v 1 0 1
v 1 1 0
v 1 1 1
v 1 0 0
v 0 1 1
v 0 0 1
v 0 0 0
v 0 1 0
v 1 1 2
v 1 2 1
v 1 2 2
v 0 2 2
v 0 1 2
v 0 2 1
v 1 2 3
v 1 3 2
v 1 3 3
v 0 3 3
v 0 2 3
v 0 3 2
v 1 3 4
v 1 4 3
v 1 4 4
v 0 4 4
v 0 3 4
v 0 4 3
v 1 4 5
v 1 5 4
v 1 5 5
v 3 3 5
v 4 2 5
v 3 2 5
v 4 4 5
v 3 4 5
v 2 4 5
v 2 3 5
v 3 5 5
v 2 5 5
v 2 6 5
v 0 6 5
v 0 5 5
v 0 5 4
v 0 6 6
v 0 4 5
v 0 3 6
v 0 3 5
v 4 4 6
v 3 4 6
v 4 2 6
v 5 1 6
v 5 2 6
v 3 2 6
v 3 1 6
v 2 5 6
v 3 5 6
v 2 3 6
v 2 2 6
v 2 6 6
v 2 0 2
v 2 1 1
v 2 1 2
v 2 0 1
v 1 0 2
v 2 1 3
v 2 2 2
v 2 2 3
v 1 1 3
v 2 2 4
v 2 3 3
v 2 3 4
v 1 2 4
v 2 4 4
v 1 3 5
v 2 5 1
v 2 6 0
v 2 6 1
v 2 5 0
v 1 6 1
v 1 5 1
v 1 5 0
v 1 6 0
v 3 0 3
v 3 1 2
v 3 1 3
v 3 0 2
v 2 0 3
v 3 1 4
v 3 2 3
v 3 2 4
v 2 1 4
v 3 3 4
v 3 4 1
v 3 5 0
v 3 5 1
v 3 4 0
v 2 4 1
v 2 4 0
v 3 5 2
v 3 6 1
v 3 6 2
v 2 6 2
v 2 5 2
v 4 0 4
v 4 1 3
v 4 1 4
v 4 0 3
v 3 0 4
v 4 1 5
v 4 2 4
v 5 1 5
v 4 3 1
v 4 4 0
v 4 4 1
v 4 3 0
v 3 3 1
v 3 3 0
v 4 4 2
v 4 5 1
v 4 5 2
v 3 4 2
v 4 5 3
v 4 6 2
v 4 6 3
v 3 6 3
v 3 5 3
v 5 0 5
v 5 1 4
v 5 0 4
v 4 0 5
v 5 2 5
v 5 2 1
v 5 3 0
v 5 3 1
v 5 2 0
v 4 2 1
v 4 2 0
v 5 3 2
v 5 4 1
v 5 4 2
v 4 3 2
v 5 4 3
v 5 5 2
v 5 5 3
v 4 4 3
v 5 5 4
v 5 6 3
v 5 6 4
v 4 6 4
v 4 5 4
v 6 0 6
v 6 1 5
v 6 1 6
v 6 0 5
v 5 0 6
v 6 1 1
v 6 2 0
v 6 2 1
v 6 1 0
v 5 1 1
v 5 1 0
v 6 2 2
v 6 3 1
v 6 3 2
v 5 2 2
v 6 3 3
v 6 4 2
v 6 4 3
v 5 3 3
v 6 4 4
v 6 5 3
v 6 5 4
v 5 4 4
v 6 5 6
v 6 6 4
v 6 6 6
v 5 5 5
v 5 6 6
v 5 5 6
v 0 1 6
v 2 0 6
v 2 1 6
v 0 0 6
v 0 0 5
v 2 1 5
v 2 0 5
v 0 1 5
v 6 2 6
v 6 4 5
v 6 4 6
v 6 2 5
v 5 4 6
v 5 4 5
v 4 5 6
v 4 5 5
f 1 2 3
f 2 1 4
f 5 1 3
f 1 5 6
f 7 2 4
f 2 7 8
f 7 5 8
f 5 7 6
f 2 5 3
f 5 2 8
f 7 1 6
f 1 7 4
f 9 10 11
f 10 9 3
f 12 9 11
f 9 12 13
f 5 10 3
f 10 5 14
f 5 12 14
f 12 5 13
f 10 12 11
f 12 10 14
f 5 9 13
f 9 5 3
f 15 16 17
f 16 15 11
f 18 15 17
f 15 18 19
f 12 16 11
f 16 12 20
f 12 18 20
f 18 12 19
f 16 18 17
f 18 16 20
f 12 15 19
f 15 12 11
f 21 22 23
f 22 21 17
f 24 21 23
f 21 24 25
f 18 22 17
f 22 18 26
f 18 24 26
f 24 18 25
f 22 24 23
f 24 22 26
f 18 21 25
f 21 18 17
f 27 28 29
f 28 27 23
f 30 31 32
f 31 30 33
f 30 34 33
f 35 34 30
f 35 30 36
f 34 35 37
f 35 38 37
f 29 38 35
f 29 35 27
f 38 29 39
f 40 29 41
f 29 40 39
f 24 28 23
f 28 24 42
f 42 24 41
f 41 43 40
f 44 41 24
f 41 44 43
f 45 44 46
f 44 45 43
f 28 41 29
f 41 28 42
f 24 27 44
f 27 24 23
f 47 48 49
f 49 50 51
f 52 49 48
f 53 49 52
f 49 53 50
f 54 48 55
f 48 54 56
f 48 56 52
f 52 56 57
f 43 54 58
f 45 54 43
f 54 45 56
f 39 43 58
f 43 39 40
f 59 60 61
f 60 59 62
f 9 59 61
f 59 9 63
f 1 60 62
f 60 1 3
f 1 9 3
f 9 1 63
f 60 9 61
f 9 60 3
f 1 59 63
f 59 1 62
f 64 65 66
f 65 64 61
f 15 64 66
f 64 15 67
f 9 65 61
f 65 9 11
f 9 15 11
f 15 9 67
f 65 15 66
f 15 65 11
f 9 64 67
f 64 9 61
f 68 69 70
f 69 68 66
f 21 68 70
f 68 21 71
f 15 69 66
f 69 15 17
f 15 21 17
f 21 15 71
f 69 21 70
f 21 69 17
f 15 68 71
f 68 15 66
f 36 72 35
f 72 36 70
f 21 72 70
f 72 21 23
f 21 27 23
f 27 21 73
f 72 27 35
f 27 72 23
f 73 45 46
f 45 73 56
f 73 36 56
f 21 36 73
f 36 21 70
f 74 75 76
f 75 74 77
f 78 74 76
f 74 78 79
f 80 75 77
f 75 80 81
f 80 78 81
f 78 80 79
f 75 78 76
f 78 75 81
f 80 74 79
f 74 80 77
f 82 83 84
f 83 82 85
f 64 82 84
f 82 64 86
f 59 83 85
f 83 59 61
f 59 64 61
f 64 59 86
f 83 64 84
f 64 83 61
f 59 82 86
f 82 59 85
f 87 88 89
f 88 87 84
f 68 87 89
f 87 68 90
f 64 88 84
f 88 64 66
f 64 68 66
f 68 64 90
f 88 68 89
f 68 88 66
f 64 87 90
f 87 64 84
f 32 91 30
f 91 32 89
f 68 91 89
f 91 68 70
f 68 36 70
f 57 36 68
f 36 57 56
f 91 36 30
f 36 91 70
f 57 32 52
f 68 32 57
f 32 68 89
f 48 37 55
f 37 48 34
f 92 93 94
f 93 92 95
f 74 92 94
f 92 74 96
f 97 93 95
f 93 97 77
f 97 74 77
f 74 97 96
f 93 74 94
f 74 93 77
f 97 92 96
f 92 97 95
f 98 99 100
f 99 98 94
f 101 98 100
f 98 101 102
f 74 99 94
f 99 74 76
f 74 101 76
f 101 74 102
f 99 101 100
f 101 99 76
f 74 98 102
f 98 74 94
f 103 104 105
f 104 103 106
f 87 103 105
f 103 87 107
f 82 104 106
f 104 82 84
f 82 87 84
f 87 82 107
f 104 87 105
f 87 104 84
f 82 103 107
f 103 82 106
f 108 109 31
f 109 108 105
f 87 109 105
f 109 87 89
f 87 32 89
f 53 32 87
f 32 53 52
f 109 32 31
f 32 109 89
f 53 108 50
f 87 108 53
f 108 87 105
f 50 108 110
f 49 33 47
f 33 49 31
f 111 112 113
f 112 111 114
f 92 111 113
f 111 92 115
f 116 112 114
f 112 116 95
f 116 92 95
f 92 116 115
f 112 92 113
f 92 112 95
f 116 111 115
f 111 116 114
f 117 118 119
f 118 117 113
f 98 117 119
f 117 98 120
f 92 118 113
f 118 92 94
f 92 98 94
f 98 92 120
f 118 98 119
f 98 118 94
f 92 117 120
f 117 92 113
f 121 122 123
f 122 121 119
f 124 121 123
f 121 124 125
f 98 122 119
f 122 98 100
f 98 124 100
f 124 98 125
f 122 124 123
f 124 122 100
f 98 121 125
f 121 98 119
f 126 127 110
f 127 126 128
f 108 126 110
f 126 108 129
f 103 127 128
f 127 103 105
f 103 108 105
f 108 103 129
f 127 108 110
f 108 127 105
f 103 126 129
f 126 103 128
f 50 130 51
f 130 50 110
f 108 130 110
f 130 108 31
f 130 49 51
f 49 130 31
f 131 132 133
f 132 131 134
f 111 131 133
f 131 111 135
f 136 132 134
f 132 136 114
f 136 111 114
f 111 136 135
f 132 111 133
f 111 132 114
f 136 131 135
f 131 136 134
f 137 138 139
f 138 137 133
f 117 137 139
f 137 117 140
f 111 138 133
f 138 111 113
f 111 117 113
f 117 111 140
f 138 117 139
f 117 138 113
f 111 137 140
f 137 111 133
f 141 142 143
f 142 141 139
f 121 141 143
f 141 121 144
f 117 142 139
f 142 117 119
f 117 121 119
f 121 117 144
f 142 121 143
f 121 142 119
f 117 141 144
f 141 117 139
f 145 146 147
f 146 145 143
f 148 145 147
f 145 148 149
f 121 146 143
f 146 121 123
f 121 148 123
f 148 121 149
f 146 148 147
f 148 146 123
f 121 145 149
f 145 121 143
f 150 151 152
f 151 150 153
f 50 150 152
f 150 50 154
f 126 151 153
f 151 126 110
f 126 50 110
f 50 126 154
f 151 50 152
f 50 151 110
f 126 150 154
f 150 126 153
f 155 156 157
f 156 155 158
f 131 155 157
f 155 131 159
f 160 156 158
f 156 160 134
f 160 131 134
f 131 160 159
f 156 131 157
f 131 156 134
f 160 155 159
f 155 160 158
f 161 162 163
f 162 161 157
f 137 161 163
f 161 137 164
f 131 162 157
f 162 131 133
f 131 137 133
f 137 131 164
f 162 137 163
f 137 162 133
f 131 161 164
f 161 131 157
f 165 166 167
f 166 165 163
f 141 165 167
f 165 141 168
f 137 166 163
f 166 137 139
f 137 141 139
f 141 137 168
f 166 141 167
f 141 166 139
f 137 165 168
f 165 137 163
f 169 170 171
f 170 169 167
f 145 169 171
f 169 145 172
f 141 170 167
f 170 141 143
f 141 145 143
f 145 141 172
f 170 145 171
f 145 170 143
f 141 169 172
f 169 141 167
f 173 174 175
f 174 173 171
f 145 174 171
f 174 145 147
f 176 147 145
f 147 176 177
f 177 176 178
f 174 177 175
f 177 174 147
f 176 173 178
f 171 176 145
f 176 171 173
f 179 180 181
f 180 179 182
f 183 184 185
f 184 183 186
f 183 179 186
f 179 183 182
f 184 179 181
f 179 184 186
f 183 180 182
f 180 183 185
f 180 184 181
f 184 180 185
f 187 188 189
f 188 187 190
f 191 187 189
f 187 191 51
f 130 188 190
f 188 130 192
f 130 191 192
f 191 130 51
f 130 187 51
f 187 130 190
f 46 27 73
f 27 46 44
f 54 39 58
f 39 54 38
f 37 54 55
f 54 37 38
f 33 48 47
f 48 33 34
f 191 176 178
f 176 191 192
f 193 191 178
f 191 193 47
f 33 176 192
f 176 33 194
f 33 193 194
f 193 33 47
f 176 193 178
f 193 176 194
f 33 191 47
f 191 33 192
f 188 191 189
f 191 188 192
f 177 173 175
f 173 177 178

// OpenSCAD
union() {
    translate([0, 0, 0]) cube([1, 1, 1]);
    translate([0, 1, 1]) cube([1, 1, 1]);
    translate([0, 2, 2]) cube([1, 1, 1]);
    translate([0, 3, 3]) cube([1, 1, 1]);
    translate([0, 4, 4]) cube([1, 1, 1]);
    translate([0, 5, 5]) cube([1, 1, 1]);
    translate([1, 0, 1]) cube([1, 1, 1]);
    translate([1, 1, 2]) cube([1, 1, 1]);
    translate([1, 2, 3]) cube([1, 1, 1]);
    translate([1, 3, 4]) cube([1, 1, 1]);
    translate([1, 4, 5]) cube([1, 1, 1]);
    translate([1, 5, 0]) cube([1, 1, 1]);
    translate([2, 0, 2]) cube([1, 1, 1]);
    translate([2, 1, 3]) cube([1, 1, 1]);
    translate([2, 2, 4]) cube([1, 1, 1]);
    translate([2, 3, 5]) cube([1, 1, 1]);
    translate([2, 4, 0]) cube([1, 1, 1]);
    translate([2, 5, 1]) cube([1, 1, 1]);
    translate([3, 0, 3]) cube([1, 1, 1]);
    translate([3, 1, 4]) cube([1, 1, 1]);
    translate([3, 2, 5]) cube([1, 1, 1]);
    translate([3, 3, 0]) cube([1, 1, 1]);
    translate([3, 4, 1]) cube([1, 1, 1]);
    translate([3, 5, 2]) cube([1, 1, 1]);
    translate([4, 0, 4]) cube([1, 1, 1]);
    translate([4, 1, 5]) cube([1, 1, 1]);
    translate([4, 2, 0]) cube([1, 1, 1]);
    translate([4, 3, 1]) cube([1, 1, 1]);
    translate([4, 4, 2]) cube([1, 1, 1]);
    translate([4, 5, 3]) cube([1, 1, 1]);
    translate([5, 0, 5]) cube([1, 1, 1]);
    translate([5, 1, 0]) cube([1, 1, 1]);
    translate([5, 2, 1]) cube([1, 1, 1]);
    translate([5, 3, 2]) cube([1, 1, 1]);
    translate([5, 4, 3]) cube([1, 1, 1]);
    translate([5, 5, 4]) cube([1, 1, 1]);
    translate([0, 0, 5]) cube([1, 1, 1]);
    translate([1, 0, 5]) cube([1, 1, 1]);
    translate([2, 2, 5]) cube([1, 1, 1]);
    translate([3, 1, 5]) cube([1, 1, 1]);
    translate([5, 2, 5]) cube([1, 1, 1]);
    translate([0, 3, 5]) cube([1, 1, 1]);
    translate([0, 4, 5]) cube([1, 1, 1]);
    translate([1, 3, 5]) cube([1, 1, 1]);
    translate([1, 5, 5]) cube([1, 1, 1]);
    translate([2, 4, 5]) cube([1, 1, 1]);
    translate([3, 3, 5]) cube([1, 1, 1]);
    translate([4, 4, 5]) cube([1, 1, 1]);
    translate([5, 3, 5]) cube([1, 1, 1]);
    translate([5, 5, 5]) cube([1, 1, 1]);
}
